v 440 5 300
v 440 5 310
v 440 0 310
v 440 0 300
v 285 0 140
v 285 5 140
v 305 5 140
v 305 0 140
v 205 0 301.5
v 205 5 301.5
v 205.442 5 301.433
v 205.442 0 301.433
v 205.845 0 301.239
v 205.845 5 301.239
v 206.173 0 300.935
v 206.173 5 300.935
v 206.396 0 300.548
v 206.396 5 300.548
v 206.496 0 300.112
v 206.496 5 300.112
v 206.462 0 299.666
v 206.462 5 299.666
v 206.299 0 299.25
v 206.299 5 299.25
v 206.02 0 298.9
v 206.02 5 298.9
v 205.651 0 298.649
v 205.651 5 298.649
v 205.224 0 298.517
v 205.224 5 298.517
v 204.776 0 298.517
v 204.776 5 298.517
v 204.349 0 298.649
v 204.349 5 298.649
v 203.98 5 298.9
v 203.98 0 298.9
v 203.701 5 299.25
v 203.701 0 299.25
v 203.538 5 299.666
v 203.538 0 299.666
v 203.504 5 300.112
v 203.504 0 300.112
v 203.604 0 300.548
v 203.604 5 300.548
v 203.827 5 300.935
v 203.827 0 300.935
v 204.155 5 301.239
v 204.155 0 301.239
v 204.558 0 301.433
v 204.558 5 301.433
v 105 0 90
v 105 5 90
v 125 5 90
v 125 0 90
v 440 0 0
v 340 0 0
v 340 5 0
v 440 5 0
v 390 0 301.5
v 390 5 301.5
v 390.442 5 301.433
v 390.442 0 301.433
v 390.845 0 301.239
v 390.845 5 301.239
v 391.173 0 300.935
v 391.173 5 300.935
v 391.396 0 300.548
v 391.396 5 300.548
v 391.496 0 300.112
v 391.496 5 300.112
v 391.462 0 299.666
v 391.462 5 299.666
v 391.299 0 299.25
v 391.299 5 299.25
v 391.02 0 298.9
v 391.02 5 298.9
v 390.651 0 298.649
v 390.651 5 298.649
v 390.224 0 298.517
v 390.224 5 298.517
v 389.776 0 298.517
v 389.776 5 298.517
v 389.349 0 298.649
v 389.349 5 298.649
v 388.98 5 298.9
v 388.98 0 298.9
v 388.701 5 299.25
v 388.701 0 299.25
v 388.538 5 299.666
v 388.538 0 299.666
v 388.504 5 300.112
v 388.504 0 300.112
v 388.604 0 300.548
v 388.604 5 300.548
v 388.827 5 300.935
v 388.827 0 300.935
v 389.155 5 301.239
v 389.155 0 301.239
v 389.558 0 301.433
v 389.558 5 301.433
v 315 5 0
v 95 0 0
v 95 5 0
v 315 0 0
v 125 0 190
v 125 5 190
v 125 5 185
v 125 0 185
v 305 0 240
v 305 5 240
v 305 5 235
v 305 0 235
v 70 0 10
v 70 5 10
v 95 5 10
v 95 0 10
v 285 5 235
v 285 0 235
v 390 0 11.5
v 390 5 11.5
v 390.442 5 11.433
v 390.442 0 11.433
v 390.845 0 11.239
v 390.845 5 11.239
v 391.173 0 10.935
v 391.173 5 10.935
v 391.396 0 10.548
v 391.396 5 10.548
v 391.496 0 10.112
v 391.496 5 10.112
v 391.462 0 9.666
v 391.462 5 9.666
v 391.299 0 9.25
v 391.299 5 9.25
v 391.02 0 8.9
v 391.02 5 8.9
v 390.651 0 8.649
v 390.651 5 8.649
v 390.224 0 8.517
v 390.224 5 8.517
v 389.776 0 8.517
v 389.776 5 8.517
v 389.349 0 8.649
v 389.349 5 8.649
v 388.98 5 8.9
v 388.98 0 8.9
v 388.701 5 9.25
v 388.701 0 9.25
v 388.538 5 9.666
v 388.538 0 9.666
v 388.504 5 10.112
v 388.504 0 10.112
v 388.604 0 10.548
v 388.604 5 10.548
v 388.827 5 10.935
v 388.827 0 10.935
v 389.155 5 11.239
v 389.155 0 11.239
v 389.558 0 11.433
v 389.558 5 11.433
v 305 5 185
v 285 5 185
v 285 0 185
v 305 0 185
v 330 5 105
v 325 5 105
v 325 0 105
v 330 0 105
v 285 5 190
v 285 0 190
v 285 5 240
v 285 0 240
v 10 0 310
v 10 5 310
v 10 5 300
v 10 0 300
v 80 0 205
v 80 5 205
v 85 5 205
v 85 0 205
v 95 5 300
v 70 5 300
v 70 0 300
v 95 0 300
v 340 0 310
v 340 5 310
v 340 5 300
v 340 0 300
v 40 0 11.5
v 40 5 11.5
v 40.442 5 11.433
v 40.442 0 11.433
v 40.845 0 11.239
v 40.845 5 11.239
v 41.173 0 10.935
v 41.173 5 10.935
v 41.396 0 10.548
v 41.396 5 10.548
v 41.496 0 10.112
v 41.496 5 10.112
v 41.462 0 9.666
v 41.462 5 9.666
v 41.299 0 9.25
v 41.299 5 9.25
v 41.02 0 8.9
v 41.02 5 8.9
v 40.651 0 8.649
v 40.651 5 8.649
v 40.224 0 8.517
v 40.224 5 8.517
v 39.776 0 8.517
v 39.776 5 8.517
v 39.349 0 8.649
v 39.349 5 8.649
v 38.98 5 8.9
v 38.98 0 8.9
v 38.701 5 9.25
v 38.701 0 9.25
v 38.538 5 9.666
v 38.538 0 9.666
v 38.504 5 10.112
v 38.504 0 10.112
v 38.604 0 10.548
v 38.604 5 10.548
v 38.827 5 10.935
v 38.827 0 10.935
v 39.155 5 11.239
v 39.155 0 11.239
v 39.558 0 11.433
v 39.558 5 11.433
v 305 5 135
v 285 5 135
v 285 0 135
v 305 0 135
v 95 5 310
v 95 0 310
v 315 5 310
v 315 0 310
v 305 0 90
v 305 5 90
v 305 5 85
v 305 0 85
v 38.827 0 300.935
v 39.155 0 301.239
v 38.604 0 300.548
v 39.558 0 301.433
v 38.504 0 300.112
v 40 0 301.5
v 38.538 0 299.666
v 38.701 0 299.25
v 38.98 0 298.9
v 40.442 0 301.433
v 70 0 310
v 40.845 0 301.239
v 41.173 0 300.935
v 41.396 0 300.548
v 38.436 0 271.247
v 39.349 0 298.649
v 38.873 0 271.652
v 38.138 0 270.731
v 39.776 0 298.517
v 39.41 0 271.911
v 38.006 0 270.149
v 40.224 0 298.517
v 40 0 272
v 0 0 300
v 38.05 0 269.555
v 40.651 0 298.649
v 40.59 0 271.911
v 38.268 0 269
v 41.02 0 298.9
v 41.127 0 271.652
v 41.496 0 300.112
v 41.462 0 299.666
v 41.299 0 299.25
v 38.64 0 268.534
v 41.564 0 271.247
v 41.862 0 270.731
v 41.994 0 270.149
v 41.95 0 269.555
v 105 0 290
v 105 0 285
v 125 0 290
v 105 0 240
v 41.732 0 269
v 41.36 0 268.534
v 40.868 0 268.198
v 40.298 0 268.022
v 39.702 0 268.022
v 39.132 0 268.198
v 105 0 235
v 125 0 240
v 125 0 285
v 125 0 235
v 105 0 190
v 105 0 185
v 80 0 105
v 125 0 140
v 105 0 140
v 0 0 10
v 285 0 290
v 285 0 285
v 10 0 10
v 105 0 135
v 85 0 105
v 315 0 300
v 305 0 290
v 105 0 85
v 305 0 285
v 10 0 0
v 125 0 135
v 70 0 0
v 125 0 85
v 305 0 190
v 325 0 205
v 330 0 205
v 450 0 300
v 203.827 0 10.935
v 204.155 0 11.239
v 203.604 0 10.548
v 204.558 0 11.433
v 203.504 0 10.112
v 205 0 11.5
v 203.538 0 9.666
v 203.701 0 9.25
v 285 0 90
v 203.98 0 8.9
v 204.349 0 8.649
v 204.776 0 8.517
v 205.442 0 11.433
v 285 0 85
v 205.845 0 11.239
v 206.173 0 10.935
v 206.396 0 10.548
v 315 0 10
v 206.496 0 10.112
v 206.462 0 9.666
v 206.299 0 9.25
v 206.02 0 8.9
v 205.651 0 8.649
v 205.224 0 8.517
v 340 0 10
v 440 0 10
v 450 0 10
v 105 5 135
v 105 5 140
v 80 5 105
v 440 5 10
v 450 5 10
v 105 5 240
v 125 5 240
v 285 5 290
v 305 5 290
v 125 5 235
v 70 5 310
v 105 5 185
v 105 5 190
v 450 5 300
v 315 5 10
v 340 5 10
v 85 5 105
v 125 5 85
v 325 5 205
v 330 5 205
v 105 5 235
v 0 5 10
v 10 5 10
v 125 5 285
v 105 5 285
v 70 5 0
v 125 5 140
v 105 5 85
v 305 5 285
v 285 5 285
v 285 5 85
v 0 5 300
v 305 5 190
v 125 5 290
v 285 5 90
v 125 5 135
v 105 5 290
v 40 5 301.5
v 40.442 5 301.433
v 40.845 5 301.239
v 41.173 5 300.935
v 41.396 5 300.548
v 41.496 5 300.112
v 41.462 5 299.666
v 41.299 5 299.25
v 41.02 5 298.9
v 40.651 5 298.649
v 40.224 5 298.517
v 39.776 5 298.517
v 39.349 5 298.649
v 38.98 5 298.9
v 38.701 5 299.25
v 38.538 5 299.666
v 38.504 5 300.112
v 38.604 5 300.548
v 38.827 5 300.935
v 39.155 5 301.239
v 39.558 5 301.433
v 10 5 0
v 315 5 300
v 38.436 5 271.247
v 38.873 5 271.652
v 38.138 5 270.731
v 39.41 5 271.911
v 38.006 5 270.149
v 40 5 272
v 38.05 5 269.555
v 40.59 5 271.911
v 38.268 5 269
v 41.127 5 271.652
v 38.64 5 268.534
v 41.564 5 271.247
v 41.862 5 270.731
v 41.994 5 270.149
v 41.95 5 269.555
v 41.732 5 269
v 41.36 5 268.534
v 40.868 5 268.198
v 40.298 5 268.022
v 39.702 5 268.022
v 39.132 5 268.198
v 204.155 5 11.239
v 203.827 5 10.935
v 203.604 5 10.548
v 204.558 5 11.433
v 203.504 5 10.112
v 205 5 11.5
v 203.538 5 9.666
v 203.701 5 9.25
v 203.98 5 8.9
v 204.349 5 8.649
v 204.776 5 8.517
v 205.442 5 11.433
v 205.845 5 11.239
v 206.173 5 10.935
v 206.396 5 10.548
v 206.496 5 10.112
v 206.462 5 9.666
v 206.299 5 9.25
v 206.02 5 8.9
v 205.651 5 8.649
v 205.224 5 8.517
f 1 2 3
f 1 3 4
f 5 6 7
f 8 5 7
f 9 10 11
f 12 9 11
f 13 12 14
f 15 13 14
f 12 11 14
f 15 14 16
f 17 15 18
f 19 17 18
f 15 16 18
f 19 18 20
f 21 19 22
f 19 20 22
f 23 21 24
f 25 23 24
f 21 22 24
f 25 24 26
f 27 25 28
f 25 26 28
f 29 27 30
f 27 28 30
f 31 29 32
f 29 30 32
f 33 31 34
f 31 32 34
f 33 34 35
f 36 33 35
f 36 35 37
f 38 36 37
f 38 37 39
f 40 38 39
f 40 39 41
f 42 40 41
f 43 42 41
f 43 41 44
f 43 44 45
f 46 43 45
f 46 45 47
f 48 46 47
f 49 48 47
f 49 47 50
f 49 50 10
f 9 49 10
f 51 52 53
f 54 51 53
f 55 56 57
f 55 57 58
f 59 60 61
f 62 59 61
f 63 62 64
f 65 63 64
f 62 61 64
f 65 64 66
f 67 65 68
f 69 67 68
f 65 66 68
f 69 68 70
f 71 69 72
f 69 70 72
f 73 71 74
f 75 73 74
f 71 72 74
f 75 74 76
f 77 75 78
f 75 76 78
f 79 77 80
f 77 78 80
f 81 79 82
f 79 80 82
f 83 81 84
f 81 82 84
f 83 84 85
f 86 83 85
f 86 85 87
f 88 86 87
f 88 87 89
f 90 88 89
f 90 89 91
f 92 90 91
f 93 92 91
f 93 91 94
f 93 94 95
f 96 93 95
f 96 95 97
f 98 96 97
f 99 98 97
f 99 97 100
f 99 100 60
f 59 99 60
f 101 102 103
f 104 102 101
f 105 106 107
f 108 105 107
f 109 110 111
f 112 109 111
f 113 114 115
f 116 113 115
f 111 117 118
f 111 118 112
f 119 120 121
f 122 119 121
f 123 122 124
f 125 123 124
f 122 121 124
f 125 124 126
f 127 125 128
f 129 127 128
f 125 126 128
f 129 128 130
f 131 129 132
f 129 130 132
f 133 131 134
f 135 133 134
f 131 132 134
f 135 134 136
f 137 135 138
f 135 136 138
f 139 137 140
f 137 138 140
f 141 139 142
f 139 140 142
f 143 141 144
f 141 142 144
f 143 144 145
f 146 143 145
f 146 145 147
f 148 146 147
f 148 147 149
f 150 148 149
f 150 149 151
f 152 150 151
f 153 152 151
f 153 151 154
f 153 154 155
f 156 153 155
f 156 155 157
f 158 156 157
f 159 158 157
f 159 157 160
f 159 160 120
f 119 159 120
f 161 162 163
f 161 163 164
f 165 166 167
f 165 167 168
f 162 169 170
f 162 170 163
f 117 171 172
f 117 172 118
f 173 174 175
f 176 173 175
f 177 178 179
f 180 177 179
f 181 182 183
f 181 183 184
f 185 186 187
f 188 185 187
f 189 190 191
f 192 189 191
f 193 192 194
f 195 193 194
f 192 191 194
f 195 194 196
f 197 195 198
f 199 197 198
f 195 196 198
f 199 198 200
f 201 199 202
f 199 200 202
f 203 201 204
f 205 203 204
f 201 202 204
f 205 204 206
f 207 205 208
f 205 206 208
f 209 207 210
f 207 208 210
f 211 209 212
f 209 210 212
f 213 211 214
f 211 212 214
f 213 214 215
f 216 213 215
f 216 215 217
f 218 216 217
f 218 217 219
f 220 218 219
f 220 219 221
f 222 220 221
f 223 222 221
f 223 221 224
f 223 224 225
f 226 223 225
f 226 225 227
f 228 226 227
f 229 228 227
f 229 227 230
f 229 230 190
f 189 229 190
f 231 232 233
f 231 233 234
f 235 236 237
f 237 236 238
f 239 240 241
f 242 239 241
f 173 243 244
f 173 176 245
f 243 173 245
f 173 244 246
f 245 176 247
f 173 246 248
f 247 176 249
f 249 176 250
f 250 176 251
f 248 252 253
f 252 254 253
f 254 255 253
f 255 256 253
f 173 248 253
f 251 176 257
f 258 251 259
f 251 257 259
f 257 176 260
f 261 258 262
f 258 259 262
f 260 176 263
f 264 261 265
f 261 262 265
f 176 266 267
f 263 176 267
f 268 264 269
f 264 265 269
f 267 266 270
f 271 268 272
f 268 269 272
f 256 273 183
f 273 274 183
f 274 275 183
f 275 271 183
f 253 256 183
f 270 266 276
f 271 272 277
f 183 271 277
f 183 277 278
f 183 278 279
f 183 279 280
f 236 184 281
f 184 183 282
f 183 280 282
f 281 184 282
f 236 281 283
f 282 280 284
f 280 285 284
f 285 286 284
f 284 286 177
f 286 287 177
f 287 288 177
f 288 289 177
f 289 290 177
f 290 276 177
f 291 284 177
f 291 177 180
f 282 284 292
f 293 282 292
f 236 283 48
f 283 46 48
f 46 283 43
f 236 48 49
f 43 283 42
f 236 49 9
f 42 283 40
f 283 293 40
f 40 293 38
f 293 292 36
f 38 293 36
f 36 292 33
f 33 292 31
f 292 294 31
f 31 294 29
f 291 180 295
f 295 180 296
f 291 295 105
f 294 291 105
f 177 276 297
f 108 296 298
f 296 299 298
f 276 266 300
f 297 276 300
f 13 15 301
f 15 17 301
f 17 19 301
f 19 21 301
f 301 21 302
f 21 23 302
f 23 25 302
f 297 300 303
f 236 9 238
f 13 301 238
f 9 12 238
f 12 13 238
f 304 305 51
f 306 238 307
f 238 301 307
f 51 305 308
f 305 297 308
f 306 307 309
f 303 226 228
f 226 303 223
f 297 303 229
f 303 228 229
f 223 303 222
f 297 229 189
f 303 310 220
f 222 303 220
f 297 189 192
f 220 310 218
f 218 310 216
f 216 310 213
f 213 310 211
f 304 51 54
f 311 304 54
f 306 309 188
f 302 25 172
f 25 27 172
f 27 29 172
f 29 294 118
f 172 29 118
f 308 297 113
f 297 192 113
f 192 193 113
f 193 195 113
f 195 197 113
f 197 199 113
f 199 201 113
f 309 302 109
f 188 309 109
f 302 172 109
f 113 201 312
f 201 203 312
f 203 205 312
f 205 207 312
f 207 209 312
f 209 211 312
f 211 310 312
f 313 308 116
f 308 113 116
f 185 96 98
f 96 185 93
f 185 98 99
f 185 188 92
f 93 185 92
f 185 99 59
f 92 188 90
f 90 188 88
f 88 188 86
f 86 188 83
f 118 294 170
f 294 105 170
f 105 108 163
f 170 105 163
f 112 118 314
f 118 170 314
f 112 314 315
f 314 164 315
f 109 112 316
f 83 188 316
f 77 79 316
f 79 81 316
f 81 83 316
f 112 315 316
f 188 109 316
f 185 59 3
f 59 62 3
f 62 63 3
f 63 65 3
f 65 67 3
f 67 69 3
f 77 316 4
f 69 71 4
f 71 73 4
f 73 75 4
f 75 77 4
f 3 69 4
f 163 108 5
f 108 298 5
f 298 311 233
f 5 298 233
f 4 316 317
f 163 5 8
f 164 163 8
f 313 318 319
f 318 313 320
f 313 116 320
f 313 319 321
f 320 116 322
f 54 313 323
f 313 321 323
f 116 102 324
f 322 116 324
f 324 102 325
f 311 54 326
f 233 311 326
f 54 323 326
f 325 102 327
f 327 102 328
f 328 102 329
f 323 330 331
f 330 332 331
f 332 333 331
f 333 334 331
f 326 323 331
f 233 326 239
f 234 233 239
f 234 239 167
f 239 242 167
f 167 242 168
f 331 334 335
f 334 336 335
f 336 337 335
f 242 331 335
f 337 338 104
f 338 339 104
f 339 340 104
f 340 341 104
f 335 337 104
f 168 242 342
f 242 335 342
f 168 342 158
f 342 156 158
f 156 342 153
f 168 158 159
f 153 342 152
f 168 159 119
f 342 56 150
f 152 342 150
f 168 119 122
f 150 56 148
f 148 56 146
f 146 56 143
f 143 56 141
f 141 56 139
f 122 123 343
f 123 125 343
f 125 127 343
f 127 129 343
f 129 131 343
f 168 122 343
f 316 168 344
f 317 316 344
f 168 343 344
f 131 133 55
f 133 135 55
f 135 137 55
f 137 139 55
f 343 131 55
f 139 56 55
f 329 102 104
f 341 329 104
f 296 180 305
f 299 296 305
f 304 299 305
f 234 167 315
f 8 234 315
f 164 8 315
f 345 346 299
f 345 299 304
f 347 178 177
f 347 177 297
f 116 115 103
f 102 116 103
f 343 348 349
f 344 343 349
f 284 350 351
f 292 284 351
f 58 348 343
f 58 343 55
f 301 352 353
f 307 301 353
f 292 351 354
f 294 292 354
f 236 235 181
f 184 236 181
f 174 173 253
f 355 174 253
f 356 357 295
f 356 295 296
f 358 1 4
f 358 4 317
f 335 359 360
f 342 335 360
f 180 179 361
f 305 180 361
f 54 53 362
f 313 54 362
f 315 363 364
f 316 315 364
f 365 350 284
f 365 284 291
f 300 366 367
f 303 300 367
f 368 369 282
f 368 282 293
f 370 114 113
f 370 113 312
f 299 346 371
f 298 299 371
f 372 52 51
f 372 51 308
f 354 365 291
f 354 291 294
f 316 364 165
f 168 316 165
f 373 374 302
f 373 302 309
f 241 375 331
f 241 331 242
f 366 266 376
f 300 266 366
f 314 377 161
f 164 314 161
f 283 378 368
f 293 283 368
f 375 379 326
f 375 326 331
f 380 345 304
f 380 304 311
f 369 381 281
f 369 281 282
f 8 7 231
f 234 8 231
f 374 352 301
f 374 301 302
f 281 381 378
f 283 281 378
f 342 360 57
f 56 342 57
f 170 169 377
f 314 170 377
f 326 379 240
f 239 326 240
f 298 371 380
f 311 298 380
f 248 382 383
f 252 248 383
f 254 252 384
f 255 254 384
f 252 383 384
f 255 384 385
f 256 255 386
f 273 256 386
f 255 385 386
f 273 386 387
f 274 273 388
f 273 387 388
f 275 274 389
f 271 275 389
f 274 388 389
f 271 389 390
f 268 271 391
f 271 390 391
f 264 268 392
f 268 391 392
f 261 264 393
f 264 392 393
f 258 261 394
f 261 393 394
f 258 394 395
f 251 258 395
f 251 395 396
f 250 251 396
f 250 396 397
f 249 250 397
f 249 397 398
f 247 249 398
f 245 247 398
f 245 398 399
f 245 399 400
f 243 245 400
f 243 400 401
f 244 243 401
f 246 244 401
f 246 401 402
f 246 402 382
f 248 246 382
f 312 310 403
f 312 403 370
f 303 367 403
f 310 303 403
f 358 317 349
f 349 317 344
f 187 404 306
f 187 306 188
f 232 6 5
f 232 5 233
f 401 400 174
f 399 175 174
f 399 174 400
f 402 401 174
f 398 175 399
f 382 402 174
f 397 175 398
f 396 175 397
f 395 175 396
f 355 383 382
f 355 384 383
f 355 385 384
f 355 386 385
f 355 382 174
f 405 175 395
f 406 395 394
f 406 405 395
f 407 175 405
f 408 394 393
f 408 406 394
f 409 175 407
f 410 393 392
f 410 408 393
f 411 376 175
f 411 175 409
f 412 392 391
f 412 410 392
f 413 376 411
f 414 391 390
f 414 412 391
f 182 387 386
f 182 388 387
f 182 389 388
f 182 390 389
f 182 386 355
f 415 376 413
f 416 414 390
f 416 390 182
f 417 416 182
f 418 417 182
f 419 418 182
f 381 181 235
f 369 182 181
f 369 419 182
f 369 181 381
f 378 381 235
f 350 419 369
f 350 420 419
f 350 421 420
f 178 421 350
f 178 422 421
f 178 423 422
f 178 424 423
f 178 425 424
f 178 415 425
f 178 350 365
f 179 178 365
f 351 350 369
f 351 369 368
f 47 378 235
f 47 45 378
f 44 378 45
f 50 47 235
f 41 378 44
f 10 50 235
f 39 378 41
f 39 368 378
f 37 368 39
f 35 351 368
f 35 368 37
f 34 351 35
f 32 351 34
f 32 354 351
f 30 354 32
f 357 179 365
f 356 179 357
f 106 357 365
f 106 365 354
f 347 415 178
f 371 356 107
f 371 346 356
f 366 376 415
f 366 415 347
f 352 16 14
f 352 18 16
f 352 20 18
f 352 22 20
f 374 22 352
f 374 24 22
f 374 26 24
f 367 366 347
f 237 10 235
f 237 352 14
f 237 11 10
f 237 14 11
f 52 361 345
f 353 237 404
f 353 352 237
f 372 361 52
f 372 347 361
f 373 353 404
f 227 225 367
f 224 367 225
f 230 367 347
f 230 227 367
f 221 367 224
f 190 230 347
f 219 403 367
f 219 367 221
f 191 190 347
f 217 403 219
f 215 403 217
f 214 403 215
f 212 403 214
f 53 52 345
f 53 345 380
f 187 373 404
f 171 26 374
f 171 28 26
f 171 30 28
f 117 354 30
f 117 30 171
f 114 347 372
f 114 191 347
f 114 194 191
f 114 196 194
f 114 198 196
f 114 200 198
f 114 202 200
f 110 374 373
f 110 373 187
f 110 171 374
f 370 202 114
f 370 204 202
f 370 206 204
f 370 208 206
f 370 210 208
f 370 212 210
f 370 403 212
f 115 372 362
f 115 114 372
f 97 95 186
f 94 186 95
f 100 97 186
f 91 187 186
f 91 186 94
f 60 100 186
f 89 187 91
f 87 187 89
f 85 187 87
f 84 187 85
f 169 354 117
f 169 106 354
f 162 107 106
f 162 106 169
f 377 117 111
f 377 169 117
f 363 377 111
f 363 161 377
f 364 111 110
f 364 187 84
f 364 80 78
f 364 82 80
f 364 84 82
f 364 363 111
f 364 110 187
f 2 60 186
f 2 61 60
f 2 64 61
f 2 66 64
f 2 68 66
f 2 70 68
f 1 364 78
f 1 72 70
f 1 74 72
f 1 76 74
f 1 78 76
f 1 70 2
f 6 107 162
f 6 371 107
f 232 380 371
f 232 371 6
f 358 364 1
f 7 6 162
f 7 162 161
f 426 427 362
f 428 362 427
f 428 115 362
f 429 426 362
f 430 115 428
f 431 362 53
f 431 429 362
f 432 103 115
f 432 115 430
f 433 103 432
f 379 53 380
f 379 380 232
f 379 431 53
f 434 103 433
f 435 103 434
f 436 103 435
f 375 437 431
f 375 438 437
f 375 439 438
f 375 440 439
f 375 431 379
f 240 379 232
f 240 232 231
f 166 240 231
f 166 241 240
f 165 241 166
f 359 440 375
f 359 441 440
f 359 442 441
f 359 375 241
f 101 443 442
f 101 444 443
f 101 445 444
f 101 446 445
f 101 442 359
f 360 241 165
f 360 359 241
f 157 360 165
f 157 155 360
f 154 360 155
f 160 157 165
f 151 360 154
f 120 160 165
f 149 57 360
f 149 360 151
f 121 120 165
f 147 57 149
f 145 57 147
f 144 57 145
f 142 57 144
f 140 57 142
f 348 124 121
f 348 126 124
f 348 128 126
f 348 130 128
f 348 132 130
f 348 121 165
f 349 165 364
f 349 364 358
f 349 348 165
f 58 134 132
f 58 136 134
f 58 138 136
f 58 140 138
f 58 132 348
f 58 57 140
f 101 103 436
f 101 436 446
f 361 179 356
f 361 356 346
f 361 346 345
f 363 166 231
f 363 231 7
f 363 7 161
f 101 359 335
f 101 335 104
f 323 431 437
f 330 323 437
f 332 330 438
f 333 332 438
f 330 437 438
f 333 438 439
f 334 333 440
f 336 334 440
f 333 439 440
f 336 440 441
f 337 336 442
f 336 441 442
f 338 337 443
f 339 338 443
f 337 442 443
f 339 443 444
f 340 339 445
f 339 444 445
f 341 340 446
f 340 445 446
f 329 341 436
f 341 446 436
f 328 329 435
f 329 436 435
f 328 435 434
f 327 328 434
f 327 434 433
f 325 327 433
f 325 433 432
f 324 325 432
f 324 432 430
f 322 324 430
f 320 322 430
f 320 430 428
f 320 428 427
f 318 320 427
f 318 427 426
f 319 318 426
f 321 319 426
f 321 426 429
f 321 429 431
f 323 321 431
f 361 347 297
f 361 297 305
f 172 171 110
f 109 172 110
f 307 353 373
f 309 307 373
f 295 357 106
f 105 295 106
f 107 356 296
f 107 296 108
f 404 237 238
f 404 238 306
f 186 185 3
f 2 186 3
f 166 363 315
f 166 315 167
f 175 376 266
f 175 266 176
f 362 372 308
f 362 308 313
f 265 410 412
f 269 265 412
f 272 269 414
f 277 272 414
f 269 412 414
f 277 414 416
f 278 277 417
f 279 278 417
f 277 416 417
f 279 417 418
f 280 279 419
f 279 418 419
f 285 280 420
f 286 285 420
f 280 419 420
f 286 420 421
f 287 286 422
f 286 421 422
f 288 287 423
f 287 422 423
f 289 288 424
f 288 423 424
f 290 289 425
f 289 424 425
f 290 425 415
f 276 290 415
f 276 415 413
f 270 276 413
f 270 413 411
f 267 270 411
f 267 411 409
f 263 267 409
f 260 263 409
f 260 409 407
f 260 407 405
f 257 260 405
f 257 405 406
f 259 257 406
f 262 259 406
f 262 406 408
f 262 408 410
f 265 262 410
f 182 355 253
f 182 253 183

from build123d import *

# Parameters (mm, degrees)
SKIZZE1_W                       = 450
SKIZZE1_H                       = 310
AUFSATZ_LINEAR_AUSTRAGEN1_DEPTH = 5
SKIZZE2_W                       = 10
SKIZZE2_H                       = 10
SKIZZE2_W_2                     = 25
SCHNITT_LINEAR_AUSTRAGEN1_DEPTH = 547.465918425
SKIZZE3_W                       = 5
SKIZZE3_H                       = 100
SCHNITT_LINEAR_AUSTRAGEN2_DEPTH = 547.465918425
SKIZZE4_W                       = 20
SKIZZE4_H                       = 5
SCHNITT_LINEAR_AUSTRAGEN3_DEPTH = 547.465918425
SKIZZE5_R                       = 1.5
SCHNITT_LINEAR_AUSTRAGEN4_DEPTH = 547.465918425
SKIZZE6_R                       = 2
SCHNITT_LINEAR_AUSTRAGEN5_DEPTH = 547.465918425


with BuildPart() as part:
    # Skizze1 → Aufsatz-Linear austragen1 (new body)
    with BuildSketch(Plane(origin=(0, 0, 0), x_dir=(1, 0, 0), z_dir=(0, 1, 0))):
        with Locations((225, -155)):
            Rectangle(SKIZZE1_W, SKIZZE1_H)
    extrude(amount=AUFSATZ_LINEAR_AUSTRAGEN1_DEPTH)

    # Skizze2 → Schnitt-Linear austragen1 (cut, through all)
    with BuildSketch(Plane(origin=(0, 5, 0), x_dir=(1, 0, 0), z_dir=(0, 1, 0))):
        with Locations((5, -5)):
            Rectangle(SKIZZE2_W, SKIZZE2_H)
        with Locations((445, -305)):
            Rectangle(SKIZZE2_W, SKIZZE2_H)
        with Locations((445, -5)):
            Rectangle(SKIZZE2_W, SKIZZE2_H)
        with Locations((5, -305)):
            Rectangle(SKIZZE2_W, SKIZZE2_H)
        with Locations((82.5, -5)):
            Rectangle(SKIZZE2_W_2, SKIZZE2_H)
        with Locations((327.5, -5)):
            Rectangle(SKIZZE2_W_2, SKIZZE2_H)
        with Locations((327.5, -305)):
            Rectangle(SKIZZE2_W_2, SKIZZE2_H)
        with Locations((82.5, -305)):
            Rectangle(SKIZZE2_W_2, SKIZZE2_H)
    extrude(amount=-SCHNITT_LINEAR_AUSTRAGEN1_DEPTH, mode=Mode.SUBTRACT)

    # Skizze3 → Schnitt-Linear austragen2 (cut, through all)
    with BuildSketch(Plane(origin=(0, 5, 0), x_dir=(1, 0, 0), z_dir=(0, 1, 0))):
        with Locations((82.5, -155)):
            Rectangle(SKIZZE3_W, SKIZZE3_H)
        with Locations((327.5, -155)):
            Rectangle(SKIZZE3_W, SKIZZE3_H)
    extrude(amount=-SCHNITT_LINEAR_AUSTRAGEN2_DEPTH, mode=Mode.SUBTRACT)

    # Skizze4 → Schnitt-Linear austragen3 (cut, through all)
    with BuildSketch(Plane(origin=(0, 5, 0), x_dir=(1, 0, 0), z_dir=(0, 1, 0))):
        with Locations((115, -287.5)):
            Rectangle(SKIZZE4_W, SKIZZE4_H)
        with Locations((295, -287.5)):
            Rectangle(SKIZZE4_W, SKIZZE4_H)
        with Locations((115, -237.5)):
            Rectangle(SKIZZE4_W, SKIZZE4_H)
        with Locations((115, -187.5)):
            Rectangle(SKIZZE4_W, SKIZZE4_H)
        with Locations((115, -137.5)):
            Rectangle(SKIZZE4_W, SKIZZE4_H)
        with Locations((115, -87.5)):
            Rectangle(SKIZZE4_W, SKIZZE4_H)
        with Locations((295, -237.5)):
            Rectangle(SKIZZE4_W, SKIZZE4_H)
        with Locations((295, -187.5)):
            Rectangle(SKIZZE4_W, SKIZZE4_H)
        with Locations((295, -137.5)):
            Rectangle(SKIZZE4_W, SKIZZE4_H)
        with Locations((295, -87.5)):
            Rectangle(SKIZZE4_W, SKIZZE4_H)
    extrude(amount=-SCHNITT_LINEAR_AUSTRAGEN3_DEPTH, mode=Mode.SUBTRACT)

    # Skizze5 → Schnitt-Linear austragen4 (cut, through all)
    with BuildSketch(Plane(origin=(0, 5, 0), x_dir=(1, 0, 0), z_dir=(0, 1, 0))):
        with Locations(Location((40, -10, 0), (0, 0, 270))):
            Circle(SKIZZE5_R)
        with Locations(Location((205, -10, 0), (0, 0, 270))):
            Circle(SKIZZE5_R)
        with Locations(Location((390, -10, 0), (0, 0, 270))):
            Circle(SKIZZE5_R)
        with Locations(Location((40, -300, 0), (0, 0, 270))):
            Circle(SKIZZE5_R)
        with Locations(Location((205, -300, 0), (0, 0, 270))):
            Circle(SKIZZE5_R)
        with Locations(Location((390, -300, 0), (0, 0, 270))):
            Circle(SKIZZE5_R)
    extrude(amount=-SCHNITT_LINEAR_AUSTRAGEN4_DEPTH, mode=Mode.SUBTRACT)

    # Skizze6 → Schnitt-Linear austragen5 (cut, through all)
    with BuildSketch(Plane(origin=(0, 5, 0), x_dir=(1, 0, 0), z_dir=(0, 1, 0))):
        with Locations(Location((40, -270, 0), (0, 0, 270))):
            Circle(SKIZZE6_R)
    extrude(amount=-SCHNITT_LINEAR_AUSTRAGEN5_DEPTH, mode=Mode.SUBTRACT)


solid = part.part
